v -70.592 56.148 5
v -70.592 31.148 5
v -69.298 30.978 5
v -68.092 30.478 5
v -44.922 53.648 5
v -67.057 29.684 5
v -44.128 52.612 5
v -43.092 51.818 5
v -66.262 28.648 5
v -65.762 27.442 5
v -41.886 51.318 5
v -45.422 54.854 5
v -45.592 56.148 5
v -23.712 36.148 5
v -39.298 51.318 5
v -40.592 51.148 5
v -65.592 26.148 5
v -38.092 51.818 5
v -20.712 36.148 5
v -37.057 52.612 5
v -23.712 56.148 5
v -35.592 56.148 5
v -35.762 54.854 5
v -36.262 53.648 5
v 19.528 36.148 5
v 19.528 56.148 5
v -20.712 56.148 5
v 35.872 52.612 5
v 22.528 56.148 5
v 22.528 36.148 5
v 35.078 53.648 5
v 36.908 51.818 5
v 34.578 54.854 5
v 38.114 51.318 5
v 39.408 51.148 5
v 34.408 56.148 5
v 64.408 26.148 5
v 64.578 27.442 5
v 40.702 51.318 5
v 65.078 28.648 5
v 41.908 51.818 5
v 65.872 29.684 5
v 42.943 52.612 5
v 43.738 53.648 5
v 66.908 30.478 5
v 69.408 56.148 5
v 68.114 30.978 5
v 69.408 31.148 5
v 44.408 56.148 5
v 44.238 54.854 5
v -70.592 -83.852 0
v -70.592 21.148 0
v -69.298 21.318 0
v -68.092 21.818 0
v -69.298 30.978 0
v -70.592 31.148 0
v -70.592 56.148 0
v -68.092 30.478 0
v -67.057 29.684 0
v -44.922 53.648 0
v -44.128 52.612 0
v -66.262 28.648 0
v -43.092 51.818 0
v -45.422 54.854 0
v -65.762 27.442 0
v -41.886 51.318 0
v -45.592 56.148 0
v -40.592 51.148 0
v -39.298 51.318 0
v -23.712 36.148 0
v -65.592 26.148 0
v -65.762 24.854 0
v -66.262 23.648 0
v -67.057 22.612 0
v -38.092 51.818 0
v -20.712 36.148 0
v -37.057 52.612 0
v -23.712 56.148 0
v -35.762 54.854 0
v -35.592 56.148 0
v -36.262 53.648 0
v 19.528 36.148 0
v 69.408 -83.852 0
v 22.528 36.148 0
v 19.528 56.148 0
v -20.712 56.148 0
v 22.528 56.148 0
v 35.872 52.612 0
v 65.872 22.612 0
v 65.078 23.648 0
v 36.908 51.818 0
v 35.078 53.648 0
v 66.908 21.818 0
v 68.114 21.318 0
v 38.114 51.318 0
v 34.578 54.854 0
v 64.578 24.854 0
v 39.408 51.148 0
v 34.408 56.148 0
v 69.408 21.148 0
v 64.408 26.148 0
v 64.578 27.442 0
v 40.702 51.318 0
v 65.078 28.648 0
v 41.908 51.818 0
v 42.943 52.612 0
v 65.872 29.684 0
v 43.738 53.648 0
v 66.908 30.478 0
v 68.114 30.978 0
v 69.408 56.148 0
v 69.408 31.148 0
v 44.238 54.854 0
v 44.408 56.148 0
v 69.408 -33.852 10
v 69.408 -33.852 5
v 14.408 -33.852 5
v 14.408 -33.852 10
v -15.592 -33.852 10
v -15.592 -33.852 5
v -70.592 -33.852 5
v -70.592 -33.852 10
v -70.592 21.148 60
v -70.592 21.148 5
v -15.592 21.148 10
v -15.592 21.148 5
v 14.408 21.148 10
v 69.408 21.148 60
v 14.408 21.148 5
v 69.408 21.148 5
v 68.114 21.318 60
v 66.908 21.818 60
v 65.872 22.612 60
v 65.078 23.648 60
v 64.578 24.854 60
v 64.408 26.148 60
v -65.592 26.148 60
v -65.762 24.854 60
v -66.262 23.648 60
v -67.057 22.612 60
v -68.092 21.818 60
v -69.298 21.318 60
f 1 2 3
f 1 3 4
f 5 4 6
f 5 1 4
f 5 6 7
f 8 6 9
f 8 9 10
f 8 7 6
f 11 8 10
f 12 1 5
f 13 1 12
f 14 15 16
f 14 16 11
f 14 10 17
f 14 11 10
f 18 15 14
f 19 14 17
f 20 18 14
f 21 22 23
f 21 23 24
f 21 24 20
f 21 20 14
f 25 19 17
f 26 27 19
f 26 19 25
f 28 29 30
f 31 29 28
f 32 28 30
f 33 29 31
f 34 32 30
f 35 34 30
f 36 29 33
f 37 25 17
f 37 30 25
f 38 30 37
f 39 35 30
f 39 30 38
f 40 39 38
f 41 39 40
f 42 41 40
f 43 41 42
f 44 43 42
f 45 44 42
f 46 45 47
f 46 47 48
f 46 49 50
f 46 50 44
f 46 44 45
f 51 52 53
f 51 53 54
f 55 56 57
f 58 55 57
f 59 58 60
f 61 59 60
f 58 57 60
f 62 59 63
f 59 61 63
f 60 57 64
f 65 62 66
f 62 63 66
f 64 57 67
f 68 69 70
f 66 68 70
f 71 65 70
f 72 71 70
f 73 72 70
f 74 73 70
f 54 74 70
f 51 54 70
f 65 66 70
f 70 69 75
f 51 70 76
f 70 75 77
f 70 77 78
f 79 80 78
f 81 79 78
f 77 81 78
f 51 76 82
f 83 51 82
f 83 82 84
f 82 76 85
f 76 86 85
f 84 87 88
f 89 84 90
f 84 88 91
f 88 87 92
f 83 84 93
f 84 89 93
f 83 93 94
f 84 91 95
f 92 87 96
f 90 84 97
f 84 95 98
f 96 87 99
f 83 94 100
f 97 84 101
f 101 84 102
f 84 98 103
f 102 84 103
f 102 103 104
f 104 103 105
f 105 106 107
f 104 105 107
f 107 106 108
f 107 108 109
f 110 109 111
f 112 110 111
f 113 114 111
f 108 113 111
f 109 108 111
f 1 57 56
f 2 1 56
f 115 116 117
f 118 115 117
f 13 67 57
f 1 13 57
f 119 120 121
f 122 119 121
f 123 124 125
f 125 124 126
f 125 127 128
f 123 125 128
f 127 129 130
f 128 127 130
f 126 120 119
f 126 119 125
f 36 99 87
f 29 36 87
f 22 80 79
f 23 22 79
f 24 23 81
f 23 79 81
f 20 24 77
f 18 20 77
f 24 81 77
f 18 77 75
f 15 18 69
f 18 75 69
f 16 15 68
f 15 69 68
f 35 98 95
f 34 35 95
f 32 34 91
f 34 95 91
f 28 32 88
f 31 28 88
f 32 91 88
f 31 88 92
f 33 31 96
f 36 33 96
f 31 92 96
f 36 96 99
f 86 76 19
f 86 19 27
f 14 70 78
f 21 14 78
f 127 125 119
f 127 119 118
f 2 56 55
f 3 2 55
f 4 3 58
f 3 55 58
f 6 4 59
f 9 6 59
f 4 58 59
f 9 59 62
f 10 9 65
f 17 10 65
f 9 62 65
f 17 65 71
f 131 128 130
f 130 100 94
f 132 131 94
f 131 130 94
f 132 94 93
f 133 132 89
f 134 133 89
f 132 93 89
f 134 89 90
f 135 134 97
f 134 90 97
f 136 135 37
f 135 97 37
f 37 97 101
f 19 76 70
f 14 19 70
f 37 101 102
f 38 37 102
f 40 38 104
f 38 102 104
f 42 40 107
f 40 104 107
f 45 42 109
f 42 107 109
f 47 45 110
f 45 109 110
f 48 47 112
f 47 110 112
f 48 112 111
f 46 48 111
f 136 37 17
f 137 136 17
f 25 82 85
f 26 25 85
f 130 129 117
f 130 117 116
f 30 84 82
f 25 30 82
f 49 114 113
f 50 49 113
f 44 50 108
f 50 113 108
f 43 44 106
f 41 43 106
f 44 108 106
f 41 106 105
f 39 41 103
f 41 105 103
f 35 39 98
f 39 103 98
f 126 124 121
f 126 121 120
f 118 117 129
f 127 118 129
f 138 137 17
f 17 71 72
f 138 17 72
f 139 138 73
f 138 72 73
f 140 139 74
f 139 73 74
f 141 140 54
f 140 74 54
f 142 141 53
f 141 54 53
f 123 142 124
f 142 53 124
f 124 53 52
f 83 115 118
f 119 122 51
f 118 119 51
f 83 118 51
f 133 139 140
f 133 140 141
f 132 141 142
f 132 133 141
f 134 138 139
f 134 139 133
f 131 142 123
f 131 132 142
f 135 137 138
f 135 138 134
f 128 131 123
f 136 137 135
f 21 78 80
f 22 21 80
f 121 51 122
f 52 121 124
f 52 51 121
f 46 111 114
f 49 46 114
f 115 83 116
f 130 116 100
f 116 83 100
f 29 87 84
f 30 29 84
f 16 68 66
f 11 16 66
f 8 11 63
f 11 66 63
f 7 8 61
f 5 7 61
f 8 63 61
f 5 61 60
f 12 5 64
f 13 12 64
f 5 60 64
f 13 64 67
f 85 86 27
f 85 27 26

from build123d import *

# Parameters (mm, degrees)
F0_W     = 40.2394990027
F0_H     = 20
F0_W_2   = 55
F0_H_2   = 55
F1_DEPTH = 5
F0_W_3   = 30
F2_DEPTH = 10
F4_DEPTH = 141
F5_DEPTH = 60


# Not quite as in the source:
# - a feature names something its author has since deleted; it is built from what else it names


with BuildPart() as f1:
    # F0 (on Top) → F1 (new body)
    with BuildSketch(Plane.XY):
        with BuildLine():
            Line((-40.5921050906, 26.1479860185), (-65.5921050906, 26.1479860185))
            ThreePointArc((-65.5921050906, 26.1479860185), (-67.0565711847, 22.6124521126), (-70.5921050906, 21.1479860185))
            Line((-70.5921050906, 21.1479860185), (-15.5921050906, 21.1479860185))
            Line((-15.5921050906, 21.1479860185), (14.4078949094, 21.1479860185))
            Line((14.4078949094, 21.1479860185), (69.4078949094, 21.1479860185))
            ThreePointArc((69.4078949094, 21.1479860185), (65.8723610034, 22.6124521126), (64.4078949094, 26.1479860185))
            Line((64.4078949094, 26.1479860185), (39.4078949094, 26.1479860185))
            Line((39.4078949094, 26.1479860185), (-40.5921050906, 26.1479860185))
        make_face()
        with BuildLine():
            Line((-45.5921050906, 56.1479860185), (-70.5921050906, 56.1479860185))
            Line((-70.5921050906, 56.1479860185), (-70.5921050906, 31.1479860185))
            ThreePointArc((-70.5921050906, 31.1479860185), (-67.0565711847, 29.6835199245), (-65.5921050906, 26.1479860185))
            Line((-65.5921050906, 26.1479860185), (-40.5921050906, 26.1479860185))
            Line((-40.5921050906, 26.1479860185), (-40.5921050906, 51.1479860185))
            ThreePointArc((-40.5921050906, 51.1479860185), (-44.1276389966, 52.6124521126), (-45.5921050906, 56.1479860185))
        make_face()
        with Locations((-0.5921050906, 46.1479860185)):
            Rectangle(F0_W, F0_H)
        with BuildLine():
            Line((39.4078949094, 51.1479860185), (39.4078949094, 26.1479860185))
            Line((39.4078949094, 26.1479860185), (64.4078949094, 26.1479860185))
            ThreePointArc((64.4078949094, 26.1479860185), (65.8723610034, 29.6835199245), (69.4078949094, 31.1479860185))
            Line((69.4078949094, 31.1479860185), (69.4078949094, 56.1479860185))
            Line((69.4078949094, 56.1479860185), (44.4078949094, 56.1479860185))
            ThreePointArc((44.4078949094, 56.1479860185), (42.9434288153, 52.6124521126), (39.4078949094, 51.1479860185))
        make_face()
        with BuildLine():
            ThreePointArc((-35.5921050906, 56.1479860185), (-37.0565711847, 52.6124521126), (-40.5921050906, 51.1479860185))
            Line((-40.5921050906, 51.1479860185), (-40.5921050906, 26.1479860185))
            Line((-40.5921050906, 26.1479860185), (39.4078949094, 26.1479860185))
            Line((39.4078949094, 26.1479860185), (39.4078949094, 51.1479860185))
            ThreePointArc((39.4078949094, 51.1479860185), (35.8723610034, 52.6124521126), (34.4078949094, 56.1479860185))
            Line((34.4078949094, 56.1479860185), (22.5276444107, 56.1479860185))
            Line((22.5276444107, 56.1479860185), (22.5276444107, 36.1479860185))
            Line((22.5276444107, 36.1479860185), (19.5276444107, 36.1479860185))
            Line((19.5276444107, 36.1479860185), (-20.711854592, 36.1479860185))
            Line((-20.711854592, 36.1479860185), (-23.711854592, 36.1479860185))
            Line((-23.711854592, 36.1479860185), (-23.711854592, 56.1479860185))
            Line((-23.711854592, 56.1479860185), (-35.5921050906, 56.1479860185))
        make_face()
        with Locations((-43.0921050906, -6.3520139815)):
            Rectangle(F0_W_2, F0_H_2)
        with Locations((41.9078949094, -6.3520139815)):
            Rectangle(F0_W_2, F0_H_2)
    extrude(amount=F1_DEPTH)

    # F0 (on Top) → F2 (join)
    with BuildSketch(Plane.XY):
        with Locations((-0.5921050906, -6.3520139815)):
            Rectangle(F0_W_3, F0_H_2)
        Polygon((-15.5921050906, -33.8520139815), (-70.5921050906, -33.8520139815), (-70.5921050906, -83.8520139815), (69.4078949094, -83.8520139815), (69.4078949094, -33.8520139815), (14.4078949094, -33.8520139815), align=None)
    extrude(amount=F2_DEPTH)

    # F3 (on face) → F4 (cut)
    with BuildSketch(Plane(origin=(-70.5921050906, 0, 0), x_dir=(0, -1, 0), z_dir=(-1, 0, 0))):
        Polygon((83.8520139815, 10), (33.8520139815, 10), (83.8520139815, 0), align=None)
    extrude(amount=-F4_DEPTH, mode=Mode.SUBTRACT)

    # F0 (on Top) → F5 (join)
    with BuildSketch(Plane.XY):
        with BuildLine():
            Line((-40.5921050906, 26.1479860185), (-65.5921050906, 26.1479860185))
            ThreePointArc((-65.5921050906, 26.1479860185), (-67.0565711847, 22.6124521126), (-70.5921050906, 21.1479860185))
            Line((-70.5921050906, 21.1479860185), (-15.5921050906, 21.1479860185))
            Line((-15.5921050906, 21.1479860185), (14.4078949094, 21.1479860185))
            Line((14.4078949094, 21.1479860185), (69.4078949094, 21.1479860185))
            ThreePointArc((69.4078949094, 21.1479860185), (65.8723610034, 22.6124521126), (64.4078949094, 26.1479860185))
            Line((64.4078949094, 26.1479860185), (39.4078949094, 26.1479860185))
            Line((39.4078949094, 26.1479860185), (-40.5921050906, 26.1479860185))
        make_face()
    extrude(amount=F5_DEPTH)


solid = f1.part
